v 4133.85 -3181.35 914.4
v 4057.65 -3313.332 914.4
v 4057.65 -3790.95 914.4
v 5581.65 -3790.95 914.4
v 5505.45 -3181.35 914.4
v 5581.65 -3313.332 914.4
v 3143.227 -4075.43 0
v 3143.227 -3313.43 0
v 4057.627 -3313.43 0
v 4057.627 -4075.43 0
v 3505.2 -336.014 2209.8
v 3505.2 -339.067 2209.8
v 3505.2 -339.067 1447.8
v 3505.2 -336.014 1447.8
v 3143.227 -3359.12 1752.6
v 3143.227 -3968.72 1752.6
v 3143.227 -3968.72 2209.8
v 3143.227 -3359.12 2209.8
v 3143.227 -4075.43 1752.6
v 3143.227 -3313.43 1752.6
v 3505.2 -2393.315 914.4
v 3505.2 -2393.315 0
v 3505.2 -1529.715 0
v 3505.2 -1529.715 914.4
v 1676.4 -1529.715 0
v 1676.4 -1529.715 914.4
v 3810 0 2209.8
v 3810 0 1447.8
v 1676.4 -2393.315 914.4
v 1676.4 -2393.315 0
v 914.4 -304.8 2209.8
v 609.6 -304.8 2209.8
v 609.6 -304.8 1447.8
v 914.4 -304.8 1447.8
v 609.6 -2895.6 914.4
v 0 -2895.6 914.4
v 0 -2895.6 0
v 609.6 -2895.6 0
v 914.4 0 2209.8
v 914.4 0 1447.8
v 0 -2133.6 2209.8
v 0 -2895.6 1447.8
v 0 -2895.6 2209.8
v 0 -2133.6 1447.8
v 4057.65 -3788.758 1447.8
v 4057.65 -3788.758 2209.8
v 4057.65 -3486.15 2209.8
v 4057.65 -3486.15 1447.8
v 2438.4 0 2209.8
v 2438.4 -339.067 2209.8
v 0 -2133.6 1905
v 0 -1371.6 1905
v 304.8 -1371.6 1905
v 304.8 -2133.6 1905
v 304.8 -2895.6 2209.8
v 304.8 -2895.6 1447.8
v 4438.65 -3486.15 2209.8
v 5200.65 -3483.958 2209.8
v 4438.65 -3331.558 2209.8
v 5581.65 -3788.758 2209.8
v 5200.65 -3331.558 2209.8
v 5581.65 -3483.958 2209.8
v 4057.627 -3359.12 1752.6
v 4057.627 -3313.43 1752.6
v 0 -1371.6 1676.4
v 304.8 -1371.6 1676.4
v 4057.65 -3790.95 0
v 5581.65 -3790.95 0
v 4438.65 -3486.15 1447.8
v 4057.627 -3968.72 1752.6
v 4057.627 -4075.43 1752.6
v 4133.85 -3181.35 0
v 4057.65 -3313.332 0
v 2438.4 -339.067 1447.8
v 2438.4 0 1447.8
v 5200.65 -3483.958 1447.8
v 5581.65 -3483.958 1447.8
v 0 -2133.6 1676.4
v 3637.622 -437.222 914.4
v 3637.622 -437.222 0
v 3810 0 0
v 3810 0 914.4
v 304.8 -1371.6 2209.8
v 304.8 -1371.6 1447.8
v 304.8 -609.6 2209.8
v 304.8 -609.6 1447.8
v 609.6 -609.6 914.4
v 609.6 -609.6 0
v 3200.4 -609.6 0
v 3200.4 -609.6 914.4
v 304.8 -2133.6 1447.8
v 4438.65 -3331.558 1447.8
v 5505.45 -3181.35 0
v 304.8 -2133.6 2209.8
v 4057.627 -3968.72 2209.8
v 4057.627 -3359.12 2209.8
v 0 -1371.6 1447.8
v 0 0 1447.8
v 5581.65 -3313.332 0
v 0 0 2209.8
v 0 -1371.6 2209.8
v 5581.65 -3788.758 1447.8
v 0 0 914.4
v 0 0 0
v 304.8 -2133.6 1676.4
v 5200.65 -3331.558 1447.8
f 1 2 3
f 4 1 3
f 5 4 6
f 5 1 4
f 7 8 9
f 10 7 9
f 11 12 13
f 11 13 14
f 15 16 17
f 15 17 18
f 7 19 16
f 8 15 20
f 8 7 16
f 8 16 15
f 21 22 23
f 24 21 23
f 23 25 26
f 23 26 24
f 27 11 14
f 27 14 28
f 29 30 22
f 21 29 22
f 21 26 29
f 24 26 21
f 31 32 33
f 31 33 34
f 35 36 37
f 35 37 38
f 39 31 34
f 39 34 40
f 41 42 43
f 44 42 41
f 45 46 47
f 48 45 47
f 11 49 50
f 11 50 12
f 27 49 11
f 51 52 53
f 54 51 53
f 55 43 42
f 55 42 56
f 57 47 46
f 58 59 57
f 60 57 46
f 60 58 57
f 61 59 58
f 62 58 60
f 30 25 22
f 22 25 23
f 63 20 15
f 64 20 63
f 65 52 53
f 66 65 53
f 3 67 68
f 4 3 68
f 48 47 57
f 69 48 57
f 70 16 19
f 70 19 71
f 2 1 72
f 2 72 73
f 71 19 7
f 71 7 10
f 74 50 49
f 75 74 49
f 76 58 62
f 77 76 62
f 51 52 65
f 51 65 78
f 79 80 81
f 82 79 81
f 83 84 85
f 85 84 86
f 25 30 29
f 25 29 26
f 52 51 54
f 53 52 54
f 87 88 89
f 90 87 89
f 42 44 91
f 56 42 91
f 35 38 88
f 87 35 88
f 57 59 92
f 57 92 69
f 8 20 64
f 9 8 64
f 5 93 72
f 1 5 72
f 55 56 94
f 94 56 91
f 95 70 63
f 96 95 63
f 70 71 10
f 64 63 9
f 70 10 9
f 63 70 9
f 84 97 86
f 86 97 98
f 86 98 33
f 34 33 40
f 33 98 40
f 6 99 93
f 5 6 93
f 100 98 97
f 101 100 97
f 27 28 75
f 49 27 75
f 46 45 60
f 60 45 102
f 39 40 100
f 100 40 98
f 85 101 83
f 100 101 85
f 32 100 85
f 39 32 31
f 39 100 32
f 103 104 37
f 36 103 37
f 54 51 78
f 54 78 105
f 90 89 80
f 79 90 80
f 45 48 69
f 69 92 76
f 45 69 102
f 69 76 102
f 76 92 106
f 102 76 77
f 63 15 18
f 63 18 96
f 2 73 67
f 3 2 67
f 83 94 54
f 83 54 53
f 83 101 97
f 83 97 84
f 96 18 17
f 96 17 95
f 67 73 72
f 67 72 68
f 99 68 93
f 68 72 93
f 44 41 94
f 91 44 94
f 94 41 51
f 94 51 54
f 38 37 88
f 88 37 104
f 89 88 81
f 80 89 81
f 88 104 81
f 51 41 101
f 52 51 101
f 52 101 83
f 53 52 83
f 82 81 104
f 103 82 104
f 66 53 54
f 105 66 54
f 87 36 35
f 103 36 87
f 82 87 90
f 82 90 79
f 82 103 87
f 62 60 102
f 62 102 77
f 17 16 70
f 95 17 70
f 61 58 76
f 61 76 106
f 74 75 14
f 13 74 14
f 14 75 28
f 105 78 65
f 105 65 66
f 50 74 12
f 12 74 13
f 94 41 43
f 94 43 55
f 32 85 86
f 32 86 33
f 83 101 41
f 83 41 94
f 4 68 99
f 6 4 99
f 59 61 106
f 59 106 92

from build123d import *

# Parameters (mm, degrees)
F3_W      = 609.6
F3_H      = 762
F3_H_2    = 457.2
F3_W_2    = 304.8
F3_H_3    = 609.6
F3_W_3    = 914.4
F3_W_4    = 457.2
F8_DEPTH  = 914.4
F4_W      = 304.8
F4_H      = 762
F4_H_2    = 304.8
F4_H_3    = 339.06725
F9_DEPTH  = 762
F5_W      = 685.8
F5_H      = 609.6
F10_DEPTH = 914.4
F6_W      = 381
F6_H      = 302.608234
F6_H_2    = 304.8
F11_DEPTH = 762
F7_W      = 914.4
F7_H      = 762
F12_DEPTH = 1752.6
F13_W     = 914.4
F13_H     = 609.6
F15_DEPTH = 457.2
F14_W     = 304.8
F14_H     = 762
F16_DEPTH = 304.8
F17_W     = 304.8
F17_H     = 762
F18_DEPTH = 228.6
F20_W     = 1828.8
F20_H     = 863.6
F21_DEPTH = 914.4


with BuildPart() as f8:
    # F3 (on Top) → F8 (new body)
    with BuildSketch(Plane.XY):
        with Locations((304.8, -2514.6)):
            Rectangle(F3_W, F3_H)
        with Locations((304.8, -1752.6)):
            Rectangle(F3_W, F3_H)
        with Locations((304.8, -1143)):
            Rectangle(F3_W, F3_H_2)
        Polygon((0, 0), (0, -914.4), (609.6, -914.4), (609.6, -609.6), (914.4, -609.6), (914.4, 0), align=None)
        with Locations((1066.8, -304.8)):
            Rectangle(F3_W_2, F3_H_3)
        with Locations((1676.4, -304.8)):
            Rectangle(F3_W_3, F3_H_3)
        with Locations((2438.4, -304.8)):
            Rectangle(F3_W, F3_H_3)
        with Locations((2971.8, -304.8)):
            Rectangle(F3_W_4, F3_H_3)
        Polygon((3810, 0), (3200.4, 0), (3200.4, -609.6), (3637.621718, -437.221718), align=None)
    extrude(amount=F8_DEPTH)


with BuildPart() as f9:
    # F4 (on offset) → F9 (new body)
    with BuildSketch(Plane.XY.offset(1447.8)):
        with Locations((152.4, -2514.6)):
            Rectangle(F4_W, F4_H)
        with Locations((152.4, -990.6)):
            Rectangle(F4_W, F4_H)
        with Locations((762, -152.4)):
            Rectangle(F4_W, F4_H_2)
        Polygon((0, 0), (0, -609.6), (304.8, -609.6), (609.6, -304.8), (609.6, 0), align=None)
        Polygon((3505.2, -336.013854), (3810, 0), (3505.2, 0), align=None)
        with Locations((2590.8, -169.533625)):
            Rectangle(F4_W, F4_H_3)
        Polygon((3505.2, -339.06725), (3505.2, -336.013854), (3505.2, 0), (2743.2, 0), (2743.2, -339.06725), align=None)
    extrude(amount=F9_DEPTH)


with BuildPart() as f10:
    # F5 (on Top) → F10 (new body)
    with BuildSketch(Plane.XY):
        Polygon((4133.85, -3181.35), (4057.65, -3313.332272), (4057.65, -3790.95), (4133.85, -3790.95), align=None)
        with Locations((4476.75, -3486.15)):
            Rectangle(F5_W, F5_H)
        with Locations((5162.55, -3486.15)):
            Rectangle(F5_W, F5_H)
        Polygon((5581.65, -3313.332272), (5505.45, -3181.35), (5505.45, -3790.95), (5581.65, -3790.95), align=None)
    extrude(amount=F10_DEPTH)


with BuildPart() as f11:
    # F6 (on offset) → F11 (new body)
    with BuildSketch(Plane.XY.offset(1447.8)):
        with Locations((4248.15, -3637.454117)):
            Rectangle(F6_W, F6_H)
        Polygon((4438.65, -3486.15), (4438.65, -3788.758234), (5200.65, -3788.758234), (5200.65, -3483.958234), (5200.65, -3331.558234), (4438.65, -3331.558234), align=None)
        with Locations((5391.15, -3636.358234)):
            Rectangle(F6_W, F6_H_2)
    extrude(amount=F11_DEPTH)


with BuildPart() as f12:
    # F7 (on Top) → F12 (new body)
    with BuildSketch(Plane.XY):
        with Locations((3600.426878, -3694.43)):
            Rectangle(F7_W, F7_H)
    extrude(amount=F12_DEPTH)

    # F13 (on face) → F15 (join)
    with BuildSketch(Plane.XY.offset(1752.6)):
        with Locations((3600.426878, -3663.920198)):
            Rectangle(F13_W, F13_H)
    extrude(amount=F15_DEPTH)


with BuildPart() as f16:
    # F14 (on face) → F16 (new body)
    with BuildSketch(Plane.XY.offset(2209.8)):
        with Locations((152.4, -1752.6)):
            Rectangle(F14_W, F14_H)
    extrude(amount=-F16_DEPTH)


with BuildPart() as f18:
    # F17 (on face) → F18 (new body)
    with BuildSketch(Plane(origin=(0, 0, 1905), x_dir=(1, 0, 0), z_dir=(0, 0, -1))):
        with Locations((152.4, 1752.6)):
            Rectangle(F17_W, F17_H)
    extrude(amount=F18_DEPTH)


with BuildPart() as f21:
    # F20 (on Top) → F21 (new body)
    with BuildSketch(Plane.XY):
        with Locations((2590.8, -1961.515)):
            Rectangle(F20_W, F20_H)
    extrude(amount=F21_DEPTH)


solid = Compound([f8.part, f9.part, f10.part, f11.part, f12.part, f16.part, f18.part, f21.part])
